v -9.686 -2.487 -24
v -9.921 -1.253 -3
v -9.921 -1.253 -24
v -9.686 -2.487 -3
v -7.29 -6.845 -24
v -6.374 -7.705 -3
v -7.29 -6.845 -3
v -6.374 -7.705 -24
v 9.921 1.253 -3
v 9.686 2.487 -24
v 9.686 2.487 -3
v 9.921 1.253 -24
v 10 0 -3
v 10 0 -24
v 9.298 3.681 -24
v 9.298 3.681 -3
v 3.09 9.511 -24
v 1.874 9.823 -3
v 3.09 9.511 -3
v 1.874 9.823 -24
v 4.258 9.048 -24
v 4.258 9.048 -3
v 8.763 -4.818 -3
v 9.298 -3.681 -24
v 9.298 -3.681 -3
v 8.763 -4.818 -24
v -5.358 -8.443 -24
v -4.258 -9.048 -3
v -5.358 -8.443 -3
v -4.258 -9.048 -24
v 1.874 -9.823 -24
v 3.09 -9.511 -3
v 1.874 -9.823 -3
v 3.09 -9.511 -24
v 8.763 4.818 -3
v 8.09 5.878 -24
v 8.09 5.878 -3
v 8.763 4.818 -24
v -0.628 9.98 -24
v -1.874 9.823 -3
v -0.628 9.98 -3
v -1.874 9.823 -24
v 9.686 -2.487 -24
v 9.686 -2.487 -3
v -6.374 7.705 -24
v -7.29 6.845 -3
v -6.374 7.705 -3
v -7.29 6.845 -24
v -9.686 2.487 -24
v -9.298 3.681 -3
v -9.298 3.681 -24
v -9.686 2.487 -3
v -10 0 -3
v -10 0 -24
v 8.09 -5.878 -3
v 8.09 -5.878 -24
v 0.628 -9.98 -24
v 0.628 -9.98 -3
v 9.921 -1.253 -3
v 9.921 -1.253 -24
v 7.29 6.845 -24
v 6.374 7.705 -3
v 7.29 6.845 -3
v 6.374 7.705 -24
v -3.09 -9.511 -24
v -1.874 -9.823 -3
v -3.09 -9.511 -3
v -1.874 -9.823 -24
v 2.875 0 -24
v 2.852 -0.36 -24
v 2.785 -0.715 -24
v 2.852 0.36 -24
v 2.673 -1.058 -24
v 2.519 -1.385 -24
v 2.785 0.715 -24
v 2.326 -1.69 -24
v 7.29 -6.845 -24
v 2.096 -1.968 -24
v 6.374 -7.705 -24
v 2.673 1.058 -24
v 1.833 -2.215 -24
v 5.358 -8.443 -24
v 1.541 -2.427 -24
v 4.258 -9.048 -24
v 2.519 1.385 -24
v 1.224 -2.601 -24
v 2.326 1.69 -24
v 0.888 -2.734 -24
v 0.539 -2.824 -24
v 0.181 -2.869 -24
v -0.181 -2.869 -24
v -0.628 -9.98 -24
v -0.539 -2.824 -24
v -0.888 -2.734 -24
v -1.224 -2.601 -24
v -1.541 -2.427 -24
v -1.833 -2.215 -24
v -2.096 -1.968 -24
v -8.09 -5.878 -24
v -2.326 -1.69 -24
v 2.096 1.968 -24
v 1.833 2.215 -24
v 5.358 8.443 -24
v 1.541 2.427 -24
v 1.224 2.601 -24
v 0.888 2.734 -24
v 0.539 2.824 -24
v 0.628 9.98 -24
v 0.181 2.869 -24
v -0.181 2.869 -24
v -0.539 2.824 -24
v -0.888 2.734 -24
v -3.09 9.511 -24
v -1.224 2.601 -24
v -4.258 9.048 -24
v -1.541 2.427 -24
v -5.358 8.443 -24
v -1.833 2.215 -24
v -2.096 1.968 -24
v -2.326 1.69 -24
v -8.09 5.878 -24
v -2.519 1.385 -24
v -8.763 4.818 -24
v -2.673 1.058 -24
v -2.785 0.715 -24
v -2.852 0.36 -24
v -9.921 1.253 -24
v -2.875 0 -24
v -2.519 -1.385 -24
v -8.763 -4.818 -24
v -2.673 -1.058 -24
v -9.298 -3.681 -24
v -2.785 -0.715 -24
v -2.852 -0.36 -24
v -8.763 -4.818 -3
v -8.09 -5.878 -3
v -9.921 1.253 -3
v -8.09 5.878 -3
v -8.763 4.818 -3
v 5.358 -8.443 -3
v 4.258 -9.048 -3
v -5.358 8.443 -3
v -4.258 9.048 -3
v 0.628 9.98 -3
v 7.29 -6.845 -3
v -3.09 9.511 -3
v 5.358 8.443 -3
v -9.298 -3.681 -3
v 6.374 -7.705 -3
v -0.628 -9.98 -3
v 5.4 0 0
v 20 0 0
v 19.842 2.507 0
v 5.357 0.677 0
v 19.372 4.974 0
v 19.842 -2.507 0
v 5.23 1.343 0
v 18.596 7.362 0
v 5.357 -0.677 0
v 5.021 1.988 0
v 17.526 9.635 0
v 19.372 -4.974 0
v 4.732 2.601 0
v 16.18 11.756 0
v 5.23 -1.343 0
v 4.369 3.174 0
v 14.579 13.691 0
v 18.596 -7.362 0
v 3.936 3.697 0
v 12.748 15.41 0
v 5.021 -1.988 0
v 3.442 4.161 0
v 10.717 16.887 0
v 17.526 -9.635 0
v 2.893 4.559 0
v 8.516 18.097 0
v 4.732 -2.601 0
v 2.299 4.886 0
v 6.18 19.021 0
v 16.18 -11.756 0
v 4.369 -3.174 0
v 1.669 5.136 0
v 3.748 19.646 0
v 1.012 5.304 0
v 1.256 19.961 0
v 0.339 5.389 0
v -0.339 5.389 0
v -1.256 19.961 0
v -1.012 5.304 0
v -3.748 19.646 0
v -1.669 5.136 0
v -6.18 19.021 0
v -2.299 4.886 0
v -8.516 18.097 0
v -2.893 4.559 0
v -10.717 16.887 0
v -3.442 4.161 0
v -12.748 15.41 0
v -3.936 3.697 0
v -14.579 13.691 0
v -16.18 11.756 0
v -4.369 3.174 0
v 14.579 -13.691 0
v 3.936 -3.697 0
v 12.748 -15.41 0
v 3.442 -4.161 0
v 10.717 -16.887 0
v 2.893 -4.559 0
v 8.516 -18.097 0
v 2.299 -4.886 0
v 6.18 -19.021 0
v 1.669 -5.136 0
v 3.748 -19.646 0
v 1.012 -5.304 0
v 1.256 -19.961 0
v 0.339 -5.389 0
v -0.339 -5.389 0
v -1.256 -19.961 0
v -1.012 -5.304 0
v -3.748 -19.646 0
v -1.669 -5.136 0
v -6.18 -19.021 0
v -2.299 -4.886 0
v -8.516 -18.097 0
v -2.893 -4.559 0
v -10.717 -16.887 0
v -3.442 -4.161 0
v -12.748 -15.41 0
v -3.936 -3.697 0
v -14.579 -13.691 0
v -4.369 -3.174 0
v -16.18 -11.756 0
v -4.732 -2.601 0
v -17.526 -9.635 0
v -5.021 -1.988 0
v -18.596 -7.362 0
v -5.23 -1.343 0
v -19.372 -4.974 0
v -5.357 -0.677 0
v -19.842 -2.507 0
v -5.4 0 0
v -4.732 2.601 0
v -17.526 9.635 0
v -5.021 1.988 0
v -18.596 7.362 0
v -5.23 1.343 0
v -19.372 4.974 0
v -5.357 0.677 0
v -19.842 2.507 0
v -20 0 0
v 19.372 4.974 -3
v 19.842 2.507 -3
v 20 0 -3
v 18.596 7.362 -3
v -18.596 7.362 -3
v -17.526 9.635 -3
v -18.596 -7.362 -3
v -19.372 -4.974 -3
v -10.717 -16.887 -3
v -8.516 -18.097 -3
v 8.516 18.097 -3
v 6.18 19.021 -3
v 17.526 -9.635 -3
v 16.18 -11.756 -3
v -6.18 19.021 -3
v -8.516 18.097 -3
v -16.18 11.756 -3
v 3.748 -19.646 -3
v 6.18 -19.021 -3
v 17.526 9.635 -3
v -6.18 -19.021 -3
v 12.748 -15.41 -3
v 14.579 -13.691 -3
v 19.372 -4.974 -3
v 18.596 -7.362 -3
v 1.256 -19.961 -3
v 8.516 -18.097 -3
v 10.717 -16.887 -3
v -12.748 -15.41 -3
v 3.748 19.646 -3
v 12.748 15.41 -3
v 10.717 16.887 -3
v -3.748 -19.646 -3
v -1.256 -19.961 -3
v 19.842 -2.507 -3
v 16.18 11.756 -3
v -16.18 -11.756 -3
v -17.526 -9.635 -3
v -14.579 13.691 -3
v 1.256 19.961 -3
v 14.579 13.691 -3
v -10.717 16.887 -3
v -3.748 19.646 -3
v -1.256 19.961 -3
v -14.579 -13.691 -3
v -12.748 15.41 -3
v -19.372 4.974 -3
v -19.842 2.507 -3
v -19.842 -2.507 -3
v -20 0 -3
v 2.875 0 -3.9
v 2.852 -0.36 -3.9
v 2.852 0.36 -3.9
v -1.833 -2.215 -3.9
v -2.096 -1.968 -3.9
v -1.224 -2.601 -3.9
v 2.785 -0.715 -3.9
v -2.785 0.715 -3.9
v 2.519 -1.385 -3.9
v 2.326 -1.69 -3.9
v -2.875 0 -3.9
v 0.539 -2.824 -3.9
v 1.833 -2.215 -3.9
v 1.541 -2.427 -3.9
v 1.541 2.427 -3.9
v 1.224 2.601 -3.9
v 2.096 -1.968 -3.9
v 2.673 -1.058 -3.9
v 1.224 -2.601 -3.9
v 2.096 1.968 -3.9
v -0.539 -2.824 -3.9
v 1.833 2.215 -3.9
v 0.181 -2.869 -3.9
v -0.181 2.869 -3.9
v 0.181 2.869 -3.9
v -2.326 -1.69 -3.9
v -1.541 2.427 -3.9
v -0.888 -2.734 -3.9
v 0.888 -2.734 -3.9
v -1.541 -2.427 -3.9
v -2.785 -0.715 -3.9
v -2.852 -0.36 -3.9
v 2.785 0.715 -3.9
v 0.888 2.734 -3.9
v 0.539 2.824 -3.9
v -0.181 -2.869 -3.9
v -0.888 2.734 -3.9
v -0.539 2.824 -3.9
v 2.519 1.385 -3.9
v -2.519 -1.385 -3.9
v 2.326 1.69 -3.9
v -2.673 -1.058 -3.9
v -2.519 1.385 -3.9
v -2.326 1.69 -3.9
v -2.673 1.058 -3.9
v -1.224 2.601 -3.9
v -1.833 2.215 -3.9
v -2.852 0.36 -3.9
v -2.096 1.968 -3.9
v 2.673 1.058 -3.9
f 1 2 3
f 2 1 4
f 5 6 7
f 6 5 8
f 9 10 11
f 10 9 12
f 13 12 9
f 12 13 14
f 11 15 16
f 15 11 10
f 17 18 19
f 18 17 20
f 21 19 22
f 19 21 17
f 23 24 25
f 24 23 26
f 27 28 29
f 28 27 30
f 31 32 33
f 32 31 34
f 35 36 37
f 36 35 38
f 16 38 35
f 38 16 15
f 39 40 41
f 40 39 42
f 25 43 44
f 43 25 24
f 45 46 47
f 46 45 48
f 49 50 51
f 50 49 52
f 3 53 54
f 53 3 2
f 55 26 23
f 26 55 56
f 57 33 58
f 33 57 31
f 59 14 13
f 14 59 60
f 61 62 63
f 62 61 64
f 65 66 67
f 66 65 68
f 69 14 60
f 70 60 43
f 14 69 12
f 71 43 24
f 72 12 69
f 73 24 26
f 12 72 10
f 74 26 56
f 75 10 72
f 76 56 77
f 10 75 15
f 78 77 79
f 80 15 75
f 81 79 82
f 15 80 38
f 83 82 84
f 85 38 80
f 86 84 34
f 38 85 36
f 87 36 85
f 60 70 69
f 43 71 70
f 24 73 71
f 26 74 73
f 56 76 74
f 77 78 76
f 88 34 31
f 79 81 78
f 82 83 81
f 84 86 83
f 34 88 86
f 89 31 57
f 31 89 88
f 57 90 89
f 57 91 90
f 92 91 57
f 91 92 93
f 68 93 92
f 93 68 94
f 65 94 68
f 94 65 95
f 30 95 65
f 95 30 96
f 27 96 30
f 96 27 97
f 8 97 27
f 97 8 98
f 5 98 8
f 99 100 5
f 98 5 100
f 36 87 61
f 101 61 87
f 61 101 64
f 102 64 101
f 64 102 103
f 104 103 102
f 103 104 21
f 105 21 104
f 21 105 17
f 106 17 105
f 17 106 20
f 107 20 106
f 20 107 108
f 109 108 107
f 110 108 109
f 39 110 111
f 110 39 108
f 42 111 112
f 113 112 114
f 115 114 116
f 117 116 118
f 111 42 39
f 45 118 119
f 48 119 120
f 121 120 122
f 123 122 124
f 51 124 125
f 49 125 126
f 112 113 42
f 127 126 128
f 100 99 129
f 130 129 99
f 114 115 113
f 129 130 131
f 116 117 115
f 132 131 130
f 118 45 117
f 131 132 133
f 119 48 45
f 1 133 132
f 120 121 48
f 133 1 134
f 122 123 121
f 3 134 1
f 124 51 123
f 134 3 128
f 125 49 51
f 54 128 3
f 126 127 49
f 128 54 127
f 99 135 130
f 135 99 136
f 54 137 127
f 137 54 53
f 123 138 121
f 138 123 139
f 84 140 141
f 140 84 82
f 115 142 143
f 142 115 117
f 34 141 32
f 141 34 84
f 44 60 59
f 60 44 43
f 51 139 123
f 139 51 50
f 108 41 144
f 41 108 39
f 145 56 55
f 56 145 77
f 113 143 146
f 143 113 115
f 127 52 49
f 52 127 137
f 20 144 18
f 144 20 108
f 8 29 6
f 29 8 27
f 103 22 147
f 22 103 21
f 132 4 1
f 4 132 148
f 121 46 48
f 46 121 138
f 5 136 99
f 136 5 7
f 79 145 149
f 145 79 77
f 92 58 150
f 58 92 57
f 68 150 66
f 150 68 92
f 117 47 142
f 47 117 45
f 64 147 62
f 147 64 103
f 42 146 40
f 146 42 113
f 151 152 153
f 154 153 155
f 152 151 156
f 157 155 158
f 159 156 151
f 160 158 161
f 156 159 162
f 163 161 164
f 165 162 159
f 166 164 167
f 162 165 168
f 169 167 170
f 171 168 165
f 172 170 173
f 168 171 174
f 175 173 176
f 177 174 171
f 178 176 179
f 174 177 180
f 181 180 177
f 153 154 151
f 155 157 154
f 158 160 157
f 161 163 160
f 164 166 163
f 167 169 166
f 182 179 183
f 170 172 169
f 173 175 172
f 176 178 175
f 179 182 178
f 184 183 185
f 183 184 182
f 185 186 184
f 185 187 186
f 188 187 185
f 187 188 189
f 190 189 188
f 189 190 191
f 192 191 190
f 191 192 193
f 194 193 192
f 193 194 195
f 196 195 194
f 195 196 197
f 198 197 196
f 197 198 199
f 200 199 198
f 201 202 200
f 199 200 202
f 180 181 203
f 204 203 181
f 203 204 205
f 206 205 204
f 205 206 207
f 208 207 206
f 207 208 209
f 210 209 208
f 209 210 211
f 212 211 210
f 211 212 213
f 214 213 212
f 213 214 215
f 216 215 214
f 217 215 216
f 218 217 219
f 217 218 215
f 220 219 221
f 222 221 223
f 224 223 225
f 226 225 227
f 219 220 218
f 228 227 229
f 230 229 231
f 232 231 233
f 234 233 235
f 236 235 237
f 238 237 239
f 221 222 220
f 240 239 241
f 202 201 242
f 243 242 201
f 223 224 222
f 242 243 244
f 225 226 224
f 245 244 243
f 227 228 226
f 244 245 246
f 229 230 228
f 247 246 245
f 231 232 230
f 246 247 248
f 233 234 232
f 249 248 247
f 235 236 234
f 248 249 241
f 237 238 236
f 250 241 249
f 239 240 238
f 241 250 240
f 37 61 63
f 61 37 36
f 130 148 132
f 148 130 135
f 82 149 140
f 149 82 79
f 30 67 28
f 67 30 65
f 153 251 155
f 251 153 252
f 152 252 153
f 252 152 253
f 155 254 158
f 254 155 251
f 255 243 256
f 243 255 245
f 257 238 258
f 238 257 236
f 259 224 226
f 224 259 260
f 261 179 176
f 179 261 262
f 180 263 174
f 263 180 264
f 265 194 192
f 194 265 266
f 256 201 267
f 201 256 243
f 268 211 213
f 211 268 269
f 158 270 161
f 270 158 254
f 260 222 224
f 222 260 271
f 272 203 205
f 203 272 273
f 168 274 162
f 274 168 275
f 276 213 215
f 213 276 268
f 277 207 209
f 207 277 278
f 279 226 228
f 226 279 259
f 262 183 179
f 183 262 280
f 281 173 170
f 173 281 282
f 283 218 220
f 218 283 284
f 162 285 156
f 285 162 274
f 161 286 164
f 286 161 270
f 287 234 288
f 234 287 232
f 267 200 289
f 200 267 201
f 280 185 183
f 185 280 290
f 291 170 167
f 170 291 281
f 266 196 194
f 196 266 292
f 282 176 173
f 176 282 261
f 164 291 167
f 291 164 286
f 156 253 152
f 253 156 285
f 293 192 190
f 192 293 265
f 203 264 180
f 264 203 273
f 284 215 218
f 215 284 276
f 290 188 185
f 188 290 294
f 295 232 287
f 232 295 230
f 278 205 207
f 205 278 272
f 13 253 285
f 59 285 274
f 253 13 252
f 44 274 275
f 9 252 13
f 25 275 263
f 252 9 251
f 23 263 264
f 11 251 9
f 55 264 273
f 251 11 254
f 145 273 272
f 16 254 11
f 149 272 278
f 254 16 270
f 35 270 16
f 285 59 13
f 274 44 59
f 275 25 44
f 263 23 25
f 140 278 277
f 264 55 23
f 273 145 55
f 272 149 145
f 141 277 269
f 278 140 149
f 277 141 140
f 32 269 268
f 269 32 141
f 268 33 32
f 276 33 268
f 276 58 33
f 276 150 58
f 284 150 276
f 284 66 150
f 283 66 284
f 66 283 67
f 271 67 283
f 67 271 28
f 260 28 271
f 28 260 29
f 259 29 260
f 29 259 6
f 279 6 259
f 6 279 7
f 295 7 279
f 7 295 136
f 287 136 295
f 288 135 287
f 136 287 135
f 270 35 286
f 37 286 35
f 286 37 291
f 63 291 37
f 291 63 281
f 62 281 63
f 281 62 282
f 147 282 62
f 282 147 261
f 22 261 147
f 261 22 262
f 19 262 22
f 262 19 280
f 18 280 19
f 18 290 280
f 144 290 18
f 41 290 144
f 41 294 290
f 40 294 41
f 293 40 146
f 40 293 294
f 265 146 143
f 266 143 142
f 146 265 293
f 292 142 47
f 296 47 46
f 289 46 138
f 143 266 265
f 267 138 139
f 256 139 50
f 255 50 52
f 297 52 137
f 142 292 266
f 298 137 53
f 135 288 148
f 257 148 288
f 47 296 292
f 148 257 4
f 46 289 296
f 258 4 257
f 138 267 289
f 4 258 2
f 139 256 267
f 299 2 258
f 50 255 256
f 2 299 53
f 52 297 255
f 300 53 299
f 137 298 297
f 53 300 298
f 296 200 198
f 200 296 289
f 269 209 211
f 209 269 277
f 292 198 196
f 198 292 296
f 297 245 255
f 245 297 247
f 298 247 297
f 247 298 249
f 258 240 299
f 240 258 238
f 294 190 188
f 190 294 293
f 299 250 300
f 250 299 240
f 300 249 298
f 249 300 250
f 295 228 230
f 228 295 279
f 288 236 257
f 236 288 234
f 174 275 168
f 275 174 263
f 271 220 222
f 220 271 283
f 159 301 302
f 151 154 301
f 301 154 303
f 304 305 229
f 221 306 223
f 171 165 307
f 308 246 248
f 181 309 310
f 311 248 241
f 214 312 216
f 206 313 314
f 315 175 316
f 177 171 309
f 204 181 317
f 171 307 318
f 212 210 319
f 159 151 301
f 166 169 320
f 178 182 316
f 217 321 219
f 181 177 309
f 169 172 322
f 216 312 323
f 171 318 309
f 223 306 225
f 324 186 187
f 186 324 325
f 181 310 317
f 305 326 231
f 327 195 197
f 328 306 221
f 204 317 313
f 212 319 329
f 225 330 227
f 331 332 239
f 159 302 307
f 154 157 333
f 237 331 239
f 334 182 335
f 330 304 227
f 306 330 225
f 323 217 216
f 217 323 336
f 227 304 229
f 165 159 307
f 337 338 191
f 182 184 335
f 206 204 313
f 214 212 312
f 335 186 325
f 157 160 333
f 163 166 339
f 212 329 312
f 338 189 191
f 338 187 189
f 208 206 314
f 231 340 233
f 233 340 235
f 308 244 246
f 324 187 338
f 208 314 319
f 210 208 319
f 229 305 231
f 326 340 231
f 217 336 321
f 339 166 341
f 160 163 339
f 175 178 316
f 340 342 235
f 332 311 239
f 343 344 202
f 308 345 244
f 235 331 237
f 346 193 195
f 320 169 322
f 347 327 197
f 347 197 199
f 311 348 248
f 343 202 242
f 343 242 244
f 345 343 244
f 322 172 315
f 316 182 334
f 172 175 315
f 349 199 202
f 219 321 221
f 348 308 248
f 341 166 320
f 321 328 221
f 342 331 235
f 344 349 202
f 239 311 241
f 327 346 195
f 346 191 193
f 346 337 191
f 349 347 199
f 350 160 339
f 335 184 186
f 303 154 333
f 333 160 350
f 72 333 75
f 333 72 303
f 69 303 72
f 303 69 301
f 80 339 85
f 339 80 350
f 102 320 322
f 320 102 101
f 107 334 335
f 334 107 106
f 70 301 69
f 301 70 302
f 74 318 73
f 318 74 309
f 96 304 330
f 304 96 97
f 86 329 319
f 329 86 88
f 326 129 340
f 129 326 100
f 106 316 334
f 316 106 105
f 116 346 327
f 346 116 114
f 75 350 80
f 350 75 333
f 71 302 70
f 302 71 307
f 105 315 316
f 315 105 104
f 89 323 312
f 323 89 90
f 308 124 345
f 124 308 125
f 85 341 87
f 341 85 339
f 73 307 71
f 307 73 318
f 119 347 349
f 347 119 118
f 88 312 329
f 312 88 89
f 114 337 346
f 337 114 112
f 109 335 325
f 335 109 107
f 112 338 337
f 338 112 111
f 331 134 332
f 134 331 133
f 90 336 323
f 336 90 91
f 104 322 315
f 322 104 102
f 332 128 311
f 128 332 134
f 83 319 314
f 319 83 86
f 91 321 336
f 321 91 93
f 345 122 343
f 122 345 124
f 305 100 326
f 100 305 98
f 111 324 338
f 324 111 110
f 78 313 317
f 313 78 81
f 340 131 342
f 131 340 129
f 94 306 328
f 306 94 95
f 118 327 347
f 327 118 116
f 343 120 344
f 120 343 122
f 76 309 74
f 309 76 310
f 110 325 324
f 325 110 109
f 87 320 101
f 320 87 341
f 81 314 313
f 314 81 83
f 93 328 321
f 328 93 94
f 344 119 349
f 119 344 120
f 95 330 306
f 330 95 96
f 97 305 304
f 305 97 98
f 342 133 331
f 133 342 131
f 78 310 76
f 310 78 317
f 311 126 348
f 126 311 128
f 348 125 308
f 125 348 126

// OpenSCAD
$fn = 50;


difference() {
	union() {
		translate(v = [0, 0, -24.0000000000]) {
			cylinder(h = 24, r = 10.0000000000);
		}
		translate(v = [0, 0, -3.0000000000]) {
			cylinder(h = 3, r = 20.0000000000);
		}
	}
	union() {
		translate(v = [0, 0, 0]) {
			rotate(a = [0, 0, 0]) {
				difference() {
					union() {
						#translate(v = [0, 0, -24.0000000000]) {
							cylinder(h = 24, r = 2.6000000000);
						}
						#translate(v = [0, 0, -3.9000000000]) {
							cylinder(h = 3.9000000000, r1 = 2.8750000000, r2 = 5.4000000000);
						}
						#translate(v = [0, 0, -24.0000000000]) {
							cylinder(h = 24, r = 2.8750000000);
						}
						#translate(v = [0, 0, -24.0000000000]) {
							cylinder(h = 24, r = 2.6000000000);
						}
					}
					union();
				}
			}
		}
	}
}
